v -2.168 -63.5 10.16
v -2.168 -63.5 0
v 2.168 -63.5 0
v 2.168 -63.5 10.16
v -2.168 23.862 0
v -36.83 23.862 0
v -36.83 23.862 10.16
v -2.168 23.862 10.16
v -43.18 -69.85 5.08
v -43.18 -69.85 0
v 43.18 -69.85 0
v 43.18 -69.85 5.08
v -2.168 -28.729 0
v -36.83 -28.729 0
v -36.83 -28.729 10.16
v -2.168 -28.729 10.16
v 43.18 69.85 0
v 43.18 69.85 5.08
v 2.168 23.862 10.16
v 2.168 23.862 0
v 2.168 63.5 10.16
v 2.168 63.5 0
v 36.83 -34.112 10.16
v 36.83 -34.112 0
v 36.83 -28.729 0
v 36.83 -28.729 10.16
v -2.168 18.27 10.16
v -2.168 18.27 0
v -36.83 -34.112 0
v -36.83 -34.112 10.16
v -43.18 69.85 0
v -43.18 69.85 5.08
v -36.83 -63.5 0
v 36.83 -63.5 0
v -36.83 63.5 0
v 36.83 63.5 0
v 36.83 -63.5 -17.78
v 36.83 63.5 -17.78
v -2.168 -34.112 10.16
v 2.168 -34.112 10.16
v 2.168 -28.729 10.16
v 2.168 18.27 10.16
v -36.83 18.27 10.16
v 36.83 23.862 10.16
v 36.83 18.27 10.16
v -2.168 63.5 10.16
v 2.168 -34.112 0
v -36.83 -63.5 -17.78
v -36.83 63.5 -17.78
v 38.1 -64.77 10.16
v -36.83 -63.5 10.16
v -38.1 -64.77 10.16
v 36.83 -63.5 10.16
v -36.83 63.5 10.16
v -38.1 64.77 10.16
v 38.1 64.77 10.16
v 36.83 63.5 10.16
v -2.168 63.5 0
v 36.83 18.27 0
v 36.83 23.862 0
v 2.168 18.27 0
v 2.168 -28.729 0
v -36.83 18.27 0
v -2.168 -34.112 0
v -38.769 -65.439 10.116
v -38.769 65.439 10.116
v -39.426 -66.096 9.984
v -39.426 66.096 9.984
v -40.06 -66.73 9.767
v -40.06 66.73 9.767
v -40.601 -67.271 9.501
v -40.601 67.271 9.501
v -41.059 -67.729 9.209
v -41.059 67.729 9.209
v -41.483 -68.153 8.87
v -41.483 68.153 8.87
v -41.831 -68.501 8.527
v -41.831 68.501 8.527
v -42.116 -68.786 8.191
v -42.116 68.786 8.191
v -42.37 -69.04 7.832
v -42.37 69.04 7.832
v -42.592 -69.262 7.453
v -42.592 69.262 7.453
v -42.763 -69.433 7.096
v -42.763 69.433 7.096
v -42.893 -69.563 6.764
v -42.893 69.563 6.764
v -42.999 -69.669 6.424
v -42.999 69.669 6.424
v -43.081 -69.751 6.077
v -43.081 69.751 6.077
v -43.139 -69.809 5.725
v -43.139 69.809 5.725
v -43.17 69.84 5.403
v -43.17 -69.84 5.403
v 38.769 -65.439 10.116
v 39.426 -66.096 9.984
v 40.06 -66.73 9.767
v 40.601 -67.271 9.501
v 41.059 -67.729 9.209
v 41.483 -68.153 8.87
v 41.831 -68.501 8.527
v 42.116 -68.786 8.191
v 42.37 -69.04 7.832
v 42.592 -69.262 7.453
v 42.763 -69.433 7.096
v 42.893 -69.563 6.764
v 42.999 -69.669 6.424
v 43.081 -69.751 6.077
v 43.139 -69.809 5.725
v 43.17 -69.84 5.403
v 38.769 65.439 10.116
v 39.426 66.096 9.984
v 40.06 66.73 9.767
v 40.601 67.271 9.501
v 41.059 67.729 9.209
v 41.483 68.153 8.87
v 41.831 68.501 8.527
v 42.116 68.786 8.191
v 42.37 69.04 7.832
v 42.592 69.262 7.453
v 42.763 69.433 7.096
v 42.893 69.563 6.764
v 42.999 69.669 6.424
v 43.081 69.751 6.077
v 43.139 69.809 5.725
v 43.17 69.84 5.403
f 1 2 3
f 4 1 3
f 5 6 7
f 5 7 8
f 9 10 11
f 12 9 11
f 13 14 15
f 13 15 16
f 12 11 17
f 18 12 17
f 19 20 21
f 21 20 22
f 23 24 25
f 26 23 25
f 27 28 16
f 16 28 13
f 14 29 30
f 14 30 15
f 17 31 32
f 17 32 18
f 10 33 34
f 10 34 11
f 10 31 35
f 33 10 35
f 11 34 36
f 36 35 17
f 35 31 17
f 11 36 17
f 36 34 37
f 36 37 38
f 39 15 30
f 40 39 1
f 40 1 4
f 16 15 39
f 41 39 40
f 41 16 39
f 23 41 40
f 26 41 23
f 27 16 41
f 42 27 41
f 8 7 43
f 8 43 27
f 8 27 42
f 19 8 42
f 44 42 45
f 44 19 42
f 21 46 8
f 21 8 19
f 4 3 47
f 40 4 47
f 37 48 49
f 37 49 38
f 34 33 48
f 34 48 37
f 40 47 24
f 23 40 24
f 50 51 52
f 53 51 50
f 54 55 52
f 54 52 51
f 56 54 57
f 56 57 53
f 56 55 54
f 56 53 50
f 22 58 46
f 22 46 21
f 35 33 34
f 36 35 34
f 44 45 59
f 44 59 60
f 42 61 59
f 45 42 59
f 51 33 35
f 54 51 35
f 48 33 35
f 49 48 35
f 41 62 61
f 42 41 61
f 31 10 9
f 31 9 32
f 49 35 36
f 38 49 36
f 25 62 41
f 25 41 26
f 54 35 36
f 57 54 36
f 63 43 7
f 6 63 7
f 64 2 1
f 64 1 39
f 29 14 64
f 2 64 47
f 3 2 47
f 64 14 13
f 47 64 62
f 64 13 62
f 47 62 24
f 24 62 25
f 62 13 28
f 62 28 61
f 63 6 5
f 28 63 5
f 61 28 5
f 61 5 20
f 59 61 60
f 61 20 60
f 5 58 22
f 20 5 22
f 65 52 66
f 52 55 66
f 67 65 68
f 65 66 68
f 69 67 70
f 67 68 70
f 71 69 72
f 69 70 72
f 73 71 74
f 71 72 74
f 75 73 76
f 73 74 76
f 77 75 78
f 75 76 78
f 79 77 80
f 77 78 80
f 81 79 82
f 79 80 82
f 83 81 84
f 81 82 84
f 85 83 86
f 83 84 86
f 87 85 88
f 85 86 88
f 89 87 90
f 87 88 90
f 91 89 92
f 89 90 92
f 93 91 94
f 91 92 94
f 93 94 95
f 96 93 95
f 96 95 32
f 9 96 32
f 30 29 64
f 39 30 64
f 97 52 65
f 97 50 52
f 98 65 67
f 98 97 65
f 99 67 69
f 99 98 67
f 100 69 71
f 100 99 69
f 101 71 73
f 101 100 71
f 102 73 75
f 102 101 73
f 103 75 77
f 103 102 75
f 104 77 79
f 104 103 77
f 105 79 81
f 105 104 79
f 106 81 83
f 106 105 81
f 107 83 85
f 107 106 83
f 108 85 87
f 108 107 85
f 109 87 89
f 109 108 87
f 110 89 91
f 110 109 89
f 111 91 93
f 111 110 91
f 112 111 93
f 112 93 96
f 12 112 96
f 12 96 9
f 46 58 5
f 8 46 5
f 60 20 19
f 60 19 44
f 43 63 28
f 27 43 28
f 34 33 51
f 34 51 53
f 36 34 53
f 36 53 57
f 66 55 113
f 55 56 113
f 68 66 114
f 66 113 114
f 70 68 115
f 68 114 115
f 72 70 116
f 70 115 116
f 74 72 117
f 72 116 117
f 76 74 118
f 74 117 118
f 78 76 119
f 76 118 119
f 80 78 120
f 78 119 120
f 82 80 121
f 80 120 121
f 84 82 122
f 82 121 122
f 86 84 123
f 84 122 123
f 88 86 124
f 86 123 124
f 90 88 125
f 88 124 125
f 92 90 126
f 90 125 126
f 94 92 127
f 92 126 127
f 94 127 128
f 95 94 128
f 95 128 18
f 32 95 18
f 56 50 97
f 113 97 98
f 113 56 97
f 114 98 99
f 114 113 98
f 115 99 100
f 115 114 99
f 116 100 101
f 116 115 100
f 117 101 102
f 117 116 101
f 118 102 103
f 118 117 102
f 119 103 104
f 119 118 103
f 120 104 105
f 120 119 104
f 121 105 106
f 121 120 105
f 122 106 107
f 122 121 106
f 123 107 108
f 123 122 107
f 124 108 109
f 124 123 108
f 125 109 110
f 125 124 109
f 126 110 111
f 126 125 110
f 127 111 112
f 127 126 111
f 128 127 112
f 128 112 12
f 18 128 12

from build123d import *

# Parameters (mm, degrees)
F0_W     = 86.36
F0_H     = 139.7
F0_W_2   = 73.66
F0_H_2   = 127
F1_DEPTH = 10.16
F2_DEPTH = 17.78
F3_R     = 5.08
F4_W     = 4.3355189264
F4_H     = 39.6382862926
F4_H_2   = 5.59142977
F4_W_2   = 34.6622405368
F4_H_3   = 46.9996649772
F4_H_4   = 5.3825657815
F4_H_5   = 29.3880531788
F5_DEPTH = 10.16


with BuildPart() as f1:
    # F0 (on Top) → F1 (new body)
    with BuildSketch(Plane.XY):
        Rectangle(F0_W, F0_H)
        Rectangle(F0_W_2, F0_H_2, mode=Mode.SUBTRACT)
    extrude(amount=F1_DEPTH)

    # F0 (on Top) → F2 (join)
    with BuildSketch(Plane.XY):
        Rectangle(F0_W_2, F0_H_2)
    extrude(amount=-F2_DEPTH)

    # F3
    f3_edges = [f1.edges().sort_by_distance(p)[0] for p in [
        (-43.18, 0, 10.16),
        (0, 69.85, 10.16),
        (43.18, 0, 10.16),
        (0, -69.85, 10.16),
    ]]
    fillet(f3_edges, radius=F3_R)


with BuildPart() as f5:
    # F4 (on face) → F5 (new body)
    with BuildSketch(Plane.XY):
        with Locations((0, 43.6808568537)):
            Rectangle(F4_W, F4_H)
        with Locations((0, 21.0659988225)):
            Rectangle(F4_W, F4_H_2)
        with Locations((-19.4988797316, 21.0659988225)):
            Rectangle(F4_W_2, F4_H_2)
        with Locations((19.4988797316, 21.0659988225)):
            Rectangle(F4_W_2, F4_H_2)
        with Locations((0, -5.2295485511)):
            Rectangle(F4_W, F4_H_3)
        with Locations((0, -31.4206639305)):
            Rectangle(F4_W, F4_H_4)
        with Locations((-19.4988797316, -31.4206639305)):
            Rectangle(F4_W_2, F4_H_4)
        with Locations((19.4988797316, -31.4206639305)):
            Rectangle(F4_W_2, F4_H_4)
        with Locations((0, -48.8059734106)):
            Rectangle(F4_W, F4_H_5)
    extrude(amount=F5_DEPTH)


solid = Compound([f1.part, f5.part])
